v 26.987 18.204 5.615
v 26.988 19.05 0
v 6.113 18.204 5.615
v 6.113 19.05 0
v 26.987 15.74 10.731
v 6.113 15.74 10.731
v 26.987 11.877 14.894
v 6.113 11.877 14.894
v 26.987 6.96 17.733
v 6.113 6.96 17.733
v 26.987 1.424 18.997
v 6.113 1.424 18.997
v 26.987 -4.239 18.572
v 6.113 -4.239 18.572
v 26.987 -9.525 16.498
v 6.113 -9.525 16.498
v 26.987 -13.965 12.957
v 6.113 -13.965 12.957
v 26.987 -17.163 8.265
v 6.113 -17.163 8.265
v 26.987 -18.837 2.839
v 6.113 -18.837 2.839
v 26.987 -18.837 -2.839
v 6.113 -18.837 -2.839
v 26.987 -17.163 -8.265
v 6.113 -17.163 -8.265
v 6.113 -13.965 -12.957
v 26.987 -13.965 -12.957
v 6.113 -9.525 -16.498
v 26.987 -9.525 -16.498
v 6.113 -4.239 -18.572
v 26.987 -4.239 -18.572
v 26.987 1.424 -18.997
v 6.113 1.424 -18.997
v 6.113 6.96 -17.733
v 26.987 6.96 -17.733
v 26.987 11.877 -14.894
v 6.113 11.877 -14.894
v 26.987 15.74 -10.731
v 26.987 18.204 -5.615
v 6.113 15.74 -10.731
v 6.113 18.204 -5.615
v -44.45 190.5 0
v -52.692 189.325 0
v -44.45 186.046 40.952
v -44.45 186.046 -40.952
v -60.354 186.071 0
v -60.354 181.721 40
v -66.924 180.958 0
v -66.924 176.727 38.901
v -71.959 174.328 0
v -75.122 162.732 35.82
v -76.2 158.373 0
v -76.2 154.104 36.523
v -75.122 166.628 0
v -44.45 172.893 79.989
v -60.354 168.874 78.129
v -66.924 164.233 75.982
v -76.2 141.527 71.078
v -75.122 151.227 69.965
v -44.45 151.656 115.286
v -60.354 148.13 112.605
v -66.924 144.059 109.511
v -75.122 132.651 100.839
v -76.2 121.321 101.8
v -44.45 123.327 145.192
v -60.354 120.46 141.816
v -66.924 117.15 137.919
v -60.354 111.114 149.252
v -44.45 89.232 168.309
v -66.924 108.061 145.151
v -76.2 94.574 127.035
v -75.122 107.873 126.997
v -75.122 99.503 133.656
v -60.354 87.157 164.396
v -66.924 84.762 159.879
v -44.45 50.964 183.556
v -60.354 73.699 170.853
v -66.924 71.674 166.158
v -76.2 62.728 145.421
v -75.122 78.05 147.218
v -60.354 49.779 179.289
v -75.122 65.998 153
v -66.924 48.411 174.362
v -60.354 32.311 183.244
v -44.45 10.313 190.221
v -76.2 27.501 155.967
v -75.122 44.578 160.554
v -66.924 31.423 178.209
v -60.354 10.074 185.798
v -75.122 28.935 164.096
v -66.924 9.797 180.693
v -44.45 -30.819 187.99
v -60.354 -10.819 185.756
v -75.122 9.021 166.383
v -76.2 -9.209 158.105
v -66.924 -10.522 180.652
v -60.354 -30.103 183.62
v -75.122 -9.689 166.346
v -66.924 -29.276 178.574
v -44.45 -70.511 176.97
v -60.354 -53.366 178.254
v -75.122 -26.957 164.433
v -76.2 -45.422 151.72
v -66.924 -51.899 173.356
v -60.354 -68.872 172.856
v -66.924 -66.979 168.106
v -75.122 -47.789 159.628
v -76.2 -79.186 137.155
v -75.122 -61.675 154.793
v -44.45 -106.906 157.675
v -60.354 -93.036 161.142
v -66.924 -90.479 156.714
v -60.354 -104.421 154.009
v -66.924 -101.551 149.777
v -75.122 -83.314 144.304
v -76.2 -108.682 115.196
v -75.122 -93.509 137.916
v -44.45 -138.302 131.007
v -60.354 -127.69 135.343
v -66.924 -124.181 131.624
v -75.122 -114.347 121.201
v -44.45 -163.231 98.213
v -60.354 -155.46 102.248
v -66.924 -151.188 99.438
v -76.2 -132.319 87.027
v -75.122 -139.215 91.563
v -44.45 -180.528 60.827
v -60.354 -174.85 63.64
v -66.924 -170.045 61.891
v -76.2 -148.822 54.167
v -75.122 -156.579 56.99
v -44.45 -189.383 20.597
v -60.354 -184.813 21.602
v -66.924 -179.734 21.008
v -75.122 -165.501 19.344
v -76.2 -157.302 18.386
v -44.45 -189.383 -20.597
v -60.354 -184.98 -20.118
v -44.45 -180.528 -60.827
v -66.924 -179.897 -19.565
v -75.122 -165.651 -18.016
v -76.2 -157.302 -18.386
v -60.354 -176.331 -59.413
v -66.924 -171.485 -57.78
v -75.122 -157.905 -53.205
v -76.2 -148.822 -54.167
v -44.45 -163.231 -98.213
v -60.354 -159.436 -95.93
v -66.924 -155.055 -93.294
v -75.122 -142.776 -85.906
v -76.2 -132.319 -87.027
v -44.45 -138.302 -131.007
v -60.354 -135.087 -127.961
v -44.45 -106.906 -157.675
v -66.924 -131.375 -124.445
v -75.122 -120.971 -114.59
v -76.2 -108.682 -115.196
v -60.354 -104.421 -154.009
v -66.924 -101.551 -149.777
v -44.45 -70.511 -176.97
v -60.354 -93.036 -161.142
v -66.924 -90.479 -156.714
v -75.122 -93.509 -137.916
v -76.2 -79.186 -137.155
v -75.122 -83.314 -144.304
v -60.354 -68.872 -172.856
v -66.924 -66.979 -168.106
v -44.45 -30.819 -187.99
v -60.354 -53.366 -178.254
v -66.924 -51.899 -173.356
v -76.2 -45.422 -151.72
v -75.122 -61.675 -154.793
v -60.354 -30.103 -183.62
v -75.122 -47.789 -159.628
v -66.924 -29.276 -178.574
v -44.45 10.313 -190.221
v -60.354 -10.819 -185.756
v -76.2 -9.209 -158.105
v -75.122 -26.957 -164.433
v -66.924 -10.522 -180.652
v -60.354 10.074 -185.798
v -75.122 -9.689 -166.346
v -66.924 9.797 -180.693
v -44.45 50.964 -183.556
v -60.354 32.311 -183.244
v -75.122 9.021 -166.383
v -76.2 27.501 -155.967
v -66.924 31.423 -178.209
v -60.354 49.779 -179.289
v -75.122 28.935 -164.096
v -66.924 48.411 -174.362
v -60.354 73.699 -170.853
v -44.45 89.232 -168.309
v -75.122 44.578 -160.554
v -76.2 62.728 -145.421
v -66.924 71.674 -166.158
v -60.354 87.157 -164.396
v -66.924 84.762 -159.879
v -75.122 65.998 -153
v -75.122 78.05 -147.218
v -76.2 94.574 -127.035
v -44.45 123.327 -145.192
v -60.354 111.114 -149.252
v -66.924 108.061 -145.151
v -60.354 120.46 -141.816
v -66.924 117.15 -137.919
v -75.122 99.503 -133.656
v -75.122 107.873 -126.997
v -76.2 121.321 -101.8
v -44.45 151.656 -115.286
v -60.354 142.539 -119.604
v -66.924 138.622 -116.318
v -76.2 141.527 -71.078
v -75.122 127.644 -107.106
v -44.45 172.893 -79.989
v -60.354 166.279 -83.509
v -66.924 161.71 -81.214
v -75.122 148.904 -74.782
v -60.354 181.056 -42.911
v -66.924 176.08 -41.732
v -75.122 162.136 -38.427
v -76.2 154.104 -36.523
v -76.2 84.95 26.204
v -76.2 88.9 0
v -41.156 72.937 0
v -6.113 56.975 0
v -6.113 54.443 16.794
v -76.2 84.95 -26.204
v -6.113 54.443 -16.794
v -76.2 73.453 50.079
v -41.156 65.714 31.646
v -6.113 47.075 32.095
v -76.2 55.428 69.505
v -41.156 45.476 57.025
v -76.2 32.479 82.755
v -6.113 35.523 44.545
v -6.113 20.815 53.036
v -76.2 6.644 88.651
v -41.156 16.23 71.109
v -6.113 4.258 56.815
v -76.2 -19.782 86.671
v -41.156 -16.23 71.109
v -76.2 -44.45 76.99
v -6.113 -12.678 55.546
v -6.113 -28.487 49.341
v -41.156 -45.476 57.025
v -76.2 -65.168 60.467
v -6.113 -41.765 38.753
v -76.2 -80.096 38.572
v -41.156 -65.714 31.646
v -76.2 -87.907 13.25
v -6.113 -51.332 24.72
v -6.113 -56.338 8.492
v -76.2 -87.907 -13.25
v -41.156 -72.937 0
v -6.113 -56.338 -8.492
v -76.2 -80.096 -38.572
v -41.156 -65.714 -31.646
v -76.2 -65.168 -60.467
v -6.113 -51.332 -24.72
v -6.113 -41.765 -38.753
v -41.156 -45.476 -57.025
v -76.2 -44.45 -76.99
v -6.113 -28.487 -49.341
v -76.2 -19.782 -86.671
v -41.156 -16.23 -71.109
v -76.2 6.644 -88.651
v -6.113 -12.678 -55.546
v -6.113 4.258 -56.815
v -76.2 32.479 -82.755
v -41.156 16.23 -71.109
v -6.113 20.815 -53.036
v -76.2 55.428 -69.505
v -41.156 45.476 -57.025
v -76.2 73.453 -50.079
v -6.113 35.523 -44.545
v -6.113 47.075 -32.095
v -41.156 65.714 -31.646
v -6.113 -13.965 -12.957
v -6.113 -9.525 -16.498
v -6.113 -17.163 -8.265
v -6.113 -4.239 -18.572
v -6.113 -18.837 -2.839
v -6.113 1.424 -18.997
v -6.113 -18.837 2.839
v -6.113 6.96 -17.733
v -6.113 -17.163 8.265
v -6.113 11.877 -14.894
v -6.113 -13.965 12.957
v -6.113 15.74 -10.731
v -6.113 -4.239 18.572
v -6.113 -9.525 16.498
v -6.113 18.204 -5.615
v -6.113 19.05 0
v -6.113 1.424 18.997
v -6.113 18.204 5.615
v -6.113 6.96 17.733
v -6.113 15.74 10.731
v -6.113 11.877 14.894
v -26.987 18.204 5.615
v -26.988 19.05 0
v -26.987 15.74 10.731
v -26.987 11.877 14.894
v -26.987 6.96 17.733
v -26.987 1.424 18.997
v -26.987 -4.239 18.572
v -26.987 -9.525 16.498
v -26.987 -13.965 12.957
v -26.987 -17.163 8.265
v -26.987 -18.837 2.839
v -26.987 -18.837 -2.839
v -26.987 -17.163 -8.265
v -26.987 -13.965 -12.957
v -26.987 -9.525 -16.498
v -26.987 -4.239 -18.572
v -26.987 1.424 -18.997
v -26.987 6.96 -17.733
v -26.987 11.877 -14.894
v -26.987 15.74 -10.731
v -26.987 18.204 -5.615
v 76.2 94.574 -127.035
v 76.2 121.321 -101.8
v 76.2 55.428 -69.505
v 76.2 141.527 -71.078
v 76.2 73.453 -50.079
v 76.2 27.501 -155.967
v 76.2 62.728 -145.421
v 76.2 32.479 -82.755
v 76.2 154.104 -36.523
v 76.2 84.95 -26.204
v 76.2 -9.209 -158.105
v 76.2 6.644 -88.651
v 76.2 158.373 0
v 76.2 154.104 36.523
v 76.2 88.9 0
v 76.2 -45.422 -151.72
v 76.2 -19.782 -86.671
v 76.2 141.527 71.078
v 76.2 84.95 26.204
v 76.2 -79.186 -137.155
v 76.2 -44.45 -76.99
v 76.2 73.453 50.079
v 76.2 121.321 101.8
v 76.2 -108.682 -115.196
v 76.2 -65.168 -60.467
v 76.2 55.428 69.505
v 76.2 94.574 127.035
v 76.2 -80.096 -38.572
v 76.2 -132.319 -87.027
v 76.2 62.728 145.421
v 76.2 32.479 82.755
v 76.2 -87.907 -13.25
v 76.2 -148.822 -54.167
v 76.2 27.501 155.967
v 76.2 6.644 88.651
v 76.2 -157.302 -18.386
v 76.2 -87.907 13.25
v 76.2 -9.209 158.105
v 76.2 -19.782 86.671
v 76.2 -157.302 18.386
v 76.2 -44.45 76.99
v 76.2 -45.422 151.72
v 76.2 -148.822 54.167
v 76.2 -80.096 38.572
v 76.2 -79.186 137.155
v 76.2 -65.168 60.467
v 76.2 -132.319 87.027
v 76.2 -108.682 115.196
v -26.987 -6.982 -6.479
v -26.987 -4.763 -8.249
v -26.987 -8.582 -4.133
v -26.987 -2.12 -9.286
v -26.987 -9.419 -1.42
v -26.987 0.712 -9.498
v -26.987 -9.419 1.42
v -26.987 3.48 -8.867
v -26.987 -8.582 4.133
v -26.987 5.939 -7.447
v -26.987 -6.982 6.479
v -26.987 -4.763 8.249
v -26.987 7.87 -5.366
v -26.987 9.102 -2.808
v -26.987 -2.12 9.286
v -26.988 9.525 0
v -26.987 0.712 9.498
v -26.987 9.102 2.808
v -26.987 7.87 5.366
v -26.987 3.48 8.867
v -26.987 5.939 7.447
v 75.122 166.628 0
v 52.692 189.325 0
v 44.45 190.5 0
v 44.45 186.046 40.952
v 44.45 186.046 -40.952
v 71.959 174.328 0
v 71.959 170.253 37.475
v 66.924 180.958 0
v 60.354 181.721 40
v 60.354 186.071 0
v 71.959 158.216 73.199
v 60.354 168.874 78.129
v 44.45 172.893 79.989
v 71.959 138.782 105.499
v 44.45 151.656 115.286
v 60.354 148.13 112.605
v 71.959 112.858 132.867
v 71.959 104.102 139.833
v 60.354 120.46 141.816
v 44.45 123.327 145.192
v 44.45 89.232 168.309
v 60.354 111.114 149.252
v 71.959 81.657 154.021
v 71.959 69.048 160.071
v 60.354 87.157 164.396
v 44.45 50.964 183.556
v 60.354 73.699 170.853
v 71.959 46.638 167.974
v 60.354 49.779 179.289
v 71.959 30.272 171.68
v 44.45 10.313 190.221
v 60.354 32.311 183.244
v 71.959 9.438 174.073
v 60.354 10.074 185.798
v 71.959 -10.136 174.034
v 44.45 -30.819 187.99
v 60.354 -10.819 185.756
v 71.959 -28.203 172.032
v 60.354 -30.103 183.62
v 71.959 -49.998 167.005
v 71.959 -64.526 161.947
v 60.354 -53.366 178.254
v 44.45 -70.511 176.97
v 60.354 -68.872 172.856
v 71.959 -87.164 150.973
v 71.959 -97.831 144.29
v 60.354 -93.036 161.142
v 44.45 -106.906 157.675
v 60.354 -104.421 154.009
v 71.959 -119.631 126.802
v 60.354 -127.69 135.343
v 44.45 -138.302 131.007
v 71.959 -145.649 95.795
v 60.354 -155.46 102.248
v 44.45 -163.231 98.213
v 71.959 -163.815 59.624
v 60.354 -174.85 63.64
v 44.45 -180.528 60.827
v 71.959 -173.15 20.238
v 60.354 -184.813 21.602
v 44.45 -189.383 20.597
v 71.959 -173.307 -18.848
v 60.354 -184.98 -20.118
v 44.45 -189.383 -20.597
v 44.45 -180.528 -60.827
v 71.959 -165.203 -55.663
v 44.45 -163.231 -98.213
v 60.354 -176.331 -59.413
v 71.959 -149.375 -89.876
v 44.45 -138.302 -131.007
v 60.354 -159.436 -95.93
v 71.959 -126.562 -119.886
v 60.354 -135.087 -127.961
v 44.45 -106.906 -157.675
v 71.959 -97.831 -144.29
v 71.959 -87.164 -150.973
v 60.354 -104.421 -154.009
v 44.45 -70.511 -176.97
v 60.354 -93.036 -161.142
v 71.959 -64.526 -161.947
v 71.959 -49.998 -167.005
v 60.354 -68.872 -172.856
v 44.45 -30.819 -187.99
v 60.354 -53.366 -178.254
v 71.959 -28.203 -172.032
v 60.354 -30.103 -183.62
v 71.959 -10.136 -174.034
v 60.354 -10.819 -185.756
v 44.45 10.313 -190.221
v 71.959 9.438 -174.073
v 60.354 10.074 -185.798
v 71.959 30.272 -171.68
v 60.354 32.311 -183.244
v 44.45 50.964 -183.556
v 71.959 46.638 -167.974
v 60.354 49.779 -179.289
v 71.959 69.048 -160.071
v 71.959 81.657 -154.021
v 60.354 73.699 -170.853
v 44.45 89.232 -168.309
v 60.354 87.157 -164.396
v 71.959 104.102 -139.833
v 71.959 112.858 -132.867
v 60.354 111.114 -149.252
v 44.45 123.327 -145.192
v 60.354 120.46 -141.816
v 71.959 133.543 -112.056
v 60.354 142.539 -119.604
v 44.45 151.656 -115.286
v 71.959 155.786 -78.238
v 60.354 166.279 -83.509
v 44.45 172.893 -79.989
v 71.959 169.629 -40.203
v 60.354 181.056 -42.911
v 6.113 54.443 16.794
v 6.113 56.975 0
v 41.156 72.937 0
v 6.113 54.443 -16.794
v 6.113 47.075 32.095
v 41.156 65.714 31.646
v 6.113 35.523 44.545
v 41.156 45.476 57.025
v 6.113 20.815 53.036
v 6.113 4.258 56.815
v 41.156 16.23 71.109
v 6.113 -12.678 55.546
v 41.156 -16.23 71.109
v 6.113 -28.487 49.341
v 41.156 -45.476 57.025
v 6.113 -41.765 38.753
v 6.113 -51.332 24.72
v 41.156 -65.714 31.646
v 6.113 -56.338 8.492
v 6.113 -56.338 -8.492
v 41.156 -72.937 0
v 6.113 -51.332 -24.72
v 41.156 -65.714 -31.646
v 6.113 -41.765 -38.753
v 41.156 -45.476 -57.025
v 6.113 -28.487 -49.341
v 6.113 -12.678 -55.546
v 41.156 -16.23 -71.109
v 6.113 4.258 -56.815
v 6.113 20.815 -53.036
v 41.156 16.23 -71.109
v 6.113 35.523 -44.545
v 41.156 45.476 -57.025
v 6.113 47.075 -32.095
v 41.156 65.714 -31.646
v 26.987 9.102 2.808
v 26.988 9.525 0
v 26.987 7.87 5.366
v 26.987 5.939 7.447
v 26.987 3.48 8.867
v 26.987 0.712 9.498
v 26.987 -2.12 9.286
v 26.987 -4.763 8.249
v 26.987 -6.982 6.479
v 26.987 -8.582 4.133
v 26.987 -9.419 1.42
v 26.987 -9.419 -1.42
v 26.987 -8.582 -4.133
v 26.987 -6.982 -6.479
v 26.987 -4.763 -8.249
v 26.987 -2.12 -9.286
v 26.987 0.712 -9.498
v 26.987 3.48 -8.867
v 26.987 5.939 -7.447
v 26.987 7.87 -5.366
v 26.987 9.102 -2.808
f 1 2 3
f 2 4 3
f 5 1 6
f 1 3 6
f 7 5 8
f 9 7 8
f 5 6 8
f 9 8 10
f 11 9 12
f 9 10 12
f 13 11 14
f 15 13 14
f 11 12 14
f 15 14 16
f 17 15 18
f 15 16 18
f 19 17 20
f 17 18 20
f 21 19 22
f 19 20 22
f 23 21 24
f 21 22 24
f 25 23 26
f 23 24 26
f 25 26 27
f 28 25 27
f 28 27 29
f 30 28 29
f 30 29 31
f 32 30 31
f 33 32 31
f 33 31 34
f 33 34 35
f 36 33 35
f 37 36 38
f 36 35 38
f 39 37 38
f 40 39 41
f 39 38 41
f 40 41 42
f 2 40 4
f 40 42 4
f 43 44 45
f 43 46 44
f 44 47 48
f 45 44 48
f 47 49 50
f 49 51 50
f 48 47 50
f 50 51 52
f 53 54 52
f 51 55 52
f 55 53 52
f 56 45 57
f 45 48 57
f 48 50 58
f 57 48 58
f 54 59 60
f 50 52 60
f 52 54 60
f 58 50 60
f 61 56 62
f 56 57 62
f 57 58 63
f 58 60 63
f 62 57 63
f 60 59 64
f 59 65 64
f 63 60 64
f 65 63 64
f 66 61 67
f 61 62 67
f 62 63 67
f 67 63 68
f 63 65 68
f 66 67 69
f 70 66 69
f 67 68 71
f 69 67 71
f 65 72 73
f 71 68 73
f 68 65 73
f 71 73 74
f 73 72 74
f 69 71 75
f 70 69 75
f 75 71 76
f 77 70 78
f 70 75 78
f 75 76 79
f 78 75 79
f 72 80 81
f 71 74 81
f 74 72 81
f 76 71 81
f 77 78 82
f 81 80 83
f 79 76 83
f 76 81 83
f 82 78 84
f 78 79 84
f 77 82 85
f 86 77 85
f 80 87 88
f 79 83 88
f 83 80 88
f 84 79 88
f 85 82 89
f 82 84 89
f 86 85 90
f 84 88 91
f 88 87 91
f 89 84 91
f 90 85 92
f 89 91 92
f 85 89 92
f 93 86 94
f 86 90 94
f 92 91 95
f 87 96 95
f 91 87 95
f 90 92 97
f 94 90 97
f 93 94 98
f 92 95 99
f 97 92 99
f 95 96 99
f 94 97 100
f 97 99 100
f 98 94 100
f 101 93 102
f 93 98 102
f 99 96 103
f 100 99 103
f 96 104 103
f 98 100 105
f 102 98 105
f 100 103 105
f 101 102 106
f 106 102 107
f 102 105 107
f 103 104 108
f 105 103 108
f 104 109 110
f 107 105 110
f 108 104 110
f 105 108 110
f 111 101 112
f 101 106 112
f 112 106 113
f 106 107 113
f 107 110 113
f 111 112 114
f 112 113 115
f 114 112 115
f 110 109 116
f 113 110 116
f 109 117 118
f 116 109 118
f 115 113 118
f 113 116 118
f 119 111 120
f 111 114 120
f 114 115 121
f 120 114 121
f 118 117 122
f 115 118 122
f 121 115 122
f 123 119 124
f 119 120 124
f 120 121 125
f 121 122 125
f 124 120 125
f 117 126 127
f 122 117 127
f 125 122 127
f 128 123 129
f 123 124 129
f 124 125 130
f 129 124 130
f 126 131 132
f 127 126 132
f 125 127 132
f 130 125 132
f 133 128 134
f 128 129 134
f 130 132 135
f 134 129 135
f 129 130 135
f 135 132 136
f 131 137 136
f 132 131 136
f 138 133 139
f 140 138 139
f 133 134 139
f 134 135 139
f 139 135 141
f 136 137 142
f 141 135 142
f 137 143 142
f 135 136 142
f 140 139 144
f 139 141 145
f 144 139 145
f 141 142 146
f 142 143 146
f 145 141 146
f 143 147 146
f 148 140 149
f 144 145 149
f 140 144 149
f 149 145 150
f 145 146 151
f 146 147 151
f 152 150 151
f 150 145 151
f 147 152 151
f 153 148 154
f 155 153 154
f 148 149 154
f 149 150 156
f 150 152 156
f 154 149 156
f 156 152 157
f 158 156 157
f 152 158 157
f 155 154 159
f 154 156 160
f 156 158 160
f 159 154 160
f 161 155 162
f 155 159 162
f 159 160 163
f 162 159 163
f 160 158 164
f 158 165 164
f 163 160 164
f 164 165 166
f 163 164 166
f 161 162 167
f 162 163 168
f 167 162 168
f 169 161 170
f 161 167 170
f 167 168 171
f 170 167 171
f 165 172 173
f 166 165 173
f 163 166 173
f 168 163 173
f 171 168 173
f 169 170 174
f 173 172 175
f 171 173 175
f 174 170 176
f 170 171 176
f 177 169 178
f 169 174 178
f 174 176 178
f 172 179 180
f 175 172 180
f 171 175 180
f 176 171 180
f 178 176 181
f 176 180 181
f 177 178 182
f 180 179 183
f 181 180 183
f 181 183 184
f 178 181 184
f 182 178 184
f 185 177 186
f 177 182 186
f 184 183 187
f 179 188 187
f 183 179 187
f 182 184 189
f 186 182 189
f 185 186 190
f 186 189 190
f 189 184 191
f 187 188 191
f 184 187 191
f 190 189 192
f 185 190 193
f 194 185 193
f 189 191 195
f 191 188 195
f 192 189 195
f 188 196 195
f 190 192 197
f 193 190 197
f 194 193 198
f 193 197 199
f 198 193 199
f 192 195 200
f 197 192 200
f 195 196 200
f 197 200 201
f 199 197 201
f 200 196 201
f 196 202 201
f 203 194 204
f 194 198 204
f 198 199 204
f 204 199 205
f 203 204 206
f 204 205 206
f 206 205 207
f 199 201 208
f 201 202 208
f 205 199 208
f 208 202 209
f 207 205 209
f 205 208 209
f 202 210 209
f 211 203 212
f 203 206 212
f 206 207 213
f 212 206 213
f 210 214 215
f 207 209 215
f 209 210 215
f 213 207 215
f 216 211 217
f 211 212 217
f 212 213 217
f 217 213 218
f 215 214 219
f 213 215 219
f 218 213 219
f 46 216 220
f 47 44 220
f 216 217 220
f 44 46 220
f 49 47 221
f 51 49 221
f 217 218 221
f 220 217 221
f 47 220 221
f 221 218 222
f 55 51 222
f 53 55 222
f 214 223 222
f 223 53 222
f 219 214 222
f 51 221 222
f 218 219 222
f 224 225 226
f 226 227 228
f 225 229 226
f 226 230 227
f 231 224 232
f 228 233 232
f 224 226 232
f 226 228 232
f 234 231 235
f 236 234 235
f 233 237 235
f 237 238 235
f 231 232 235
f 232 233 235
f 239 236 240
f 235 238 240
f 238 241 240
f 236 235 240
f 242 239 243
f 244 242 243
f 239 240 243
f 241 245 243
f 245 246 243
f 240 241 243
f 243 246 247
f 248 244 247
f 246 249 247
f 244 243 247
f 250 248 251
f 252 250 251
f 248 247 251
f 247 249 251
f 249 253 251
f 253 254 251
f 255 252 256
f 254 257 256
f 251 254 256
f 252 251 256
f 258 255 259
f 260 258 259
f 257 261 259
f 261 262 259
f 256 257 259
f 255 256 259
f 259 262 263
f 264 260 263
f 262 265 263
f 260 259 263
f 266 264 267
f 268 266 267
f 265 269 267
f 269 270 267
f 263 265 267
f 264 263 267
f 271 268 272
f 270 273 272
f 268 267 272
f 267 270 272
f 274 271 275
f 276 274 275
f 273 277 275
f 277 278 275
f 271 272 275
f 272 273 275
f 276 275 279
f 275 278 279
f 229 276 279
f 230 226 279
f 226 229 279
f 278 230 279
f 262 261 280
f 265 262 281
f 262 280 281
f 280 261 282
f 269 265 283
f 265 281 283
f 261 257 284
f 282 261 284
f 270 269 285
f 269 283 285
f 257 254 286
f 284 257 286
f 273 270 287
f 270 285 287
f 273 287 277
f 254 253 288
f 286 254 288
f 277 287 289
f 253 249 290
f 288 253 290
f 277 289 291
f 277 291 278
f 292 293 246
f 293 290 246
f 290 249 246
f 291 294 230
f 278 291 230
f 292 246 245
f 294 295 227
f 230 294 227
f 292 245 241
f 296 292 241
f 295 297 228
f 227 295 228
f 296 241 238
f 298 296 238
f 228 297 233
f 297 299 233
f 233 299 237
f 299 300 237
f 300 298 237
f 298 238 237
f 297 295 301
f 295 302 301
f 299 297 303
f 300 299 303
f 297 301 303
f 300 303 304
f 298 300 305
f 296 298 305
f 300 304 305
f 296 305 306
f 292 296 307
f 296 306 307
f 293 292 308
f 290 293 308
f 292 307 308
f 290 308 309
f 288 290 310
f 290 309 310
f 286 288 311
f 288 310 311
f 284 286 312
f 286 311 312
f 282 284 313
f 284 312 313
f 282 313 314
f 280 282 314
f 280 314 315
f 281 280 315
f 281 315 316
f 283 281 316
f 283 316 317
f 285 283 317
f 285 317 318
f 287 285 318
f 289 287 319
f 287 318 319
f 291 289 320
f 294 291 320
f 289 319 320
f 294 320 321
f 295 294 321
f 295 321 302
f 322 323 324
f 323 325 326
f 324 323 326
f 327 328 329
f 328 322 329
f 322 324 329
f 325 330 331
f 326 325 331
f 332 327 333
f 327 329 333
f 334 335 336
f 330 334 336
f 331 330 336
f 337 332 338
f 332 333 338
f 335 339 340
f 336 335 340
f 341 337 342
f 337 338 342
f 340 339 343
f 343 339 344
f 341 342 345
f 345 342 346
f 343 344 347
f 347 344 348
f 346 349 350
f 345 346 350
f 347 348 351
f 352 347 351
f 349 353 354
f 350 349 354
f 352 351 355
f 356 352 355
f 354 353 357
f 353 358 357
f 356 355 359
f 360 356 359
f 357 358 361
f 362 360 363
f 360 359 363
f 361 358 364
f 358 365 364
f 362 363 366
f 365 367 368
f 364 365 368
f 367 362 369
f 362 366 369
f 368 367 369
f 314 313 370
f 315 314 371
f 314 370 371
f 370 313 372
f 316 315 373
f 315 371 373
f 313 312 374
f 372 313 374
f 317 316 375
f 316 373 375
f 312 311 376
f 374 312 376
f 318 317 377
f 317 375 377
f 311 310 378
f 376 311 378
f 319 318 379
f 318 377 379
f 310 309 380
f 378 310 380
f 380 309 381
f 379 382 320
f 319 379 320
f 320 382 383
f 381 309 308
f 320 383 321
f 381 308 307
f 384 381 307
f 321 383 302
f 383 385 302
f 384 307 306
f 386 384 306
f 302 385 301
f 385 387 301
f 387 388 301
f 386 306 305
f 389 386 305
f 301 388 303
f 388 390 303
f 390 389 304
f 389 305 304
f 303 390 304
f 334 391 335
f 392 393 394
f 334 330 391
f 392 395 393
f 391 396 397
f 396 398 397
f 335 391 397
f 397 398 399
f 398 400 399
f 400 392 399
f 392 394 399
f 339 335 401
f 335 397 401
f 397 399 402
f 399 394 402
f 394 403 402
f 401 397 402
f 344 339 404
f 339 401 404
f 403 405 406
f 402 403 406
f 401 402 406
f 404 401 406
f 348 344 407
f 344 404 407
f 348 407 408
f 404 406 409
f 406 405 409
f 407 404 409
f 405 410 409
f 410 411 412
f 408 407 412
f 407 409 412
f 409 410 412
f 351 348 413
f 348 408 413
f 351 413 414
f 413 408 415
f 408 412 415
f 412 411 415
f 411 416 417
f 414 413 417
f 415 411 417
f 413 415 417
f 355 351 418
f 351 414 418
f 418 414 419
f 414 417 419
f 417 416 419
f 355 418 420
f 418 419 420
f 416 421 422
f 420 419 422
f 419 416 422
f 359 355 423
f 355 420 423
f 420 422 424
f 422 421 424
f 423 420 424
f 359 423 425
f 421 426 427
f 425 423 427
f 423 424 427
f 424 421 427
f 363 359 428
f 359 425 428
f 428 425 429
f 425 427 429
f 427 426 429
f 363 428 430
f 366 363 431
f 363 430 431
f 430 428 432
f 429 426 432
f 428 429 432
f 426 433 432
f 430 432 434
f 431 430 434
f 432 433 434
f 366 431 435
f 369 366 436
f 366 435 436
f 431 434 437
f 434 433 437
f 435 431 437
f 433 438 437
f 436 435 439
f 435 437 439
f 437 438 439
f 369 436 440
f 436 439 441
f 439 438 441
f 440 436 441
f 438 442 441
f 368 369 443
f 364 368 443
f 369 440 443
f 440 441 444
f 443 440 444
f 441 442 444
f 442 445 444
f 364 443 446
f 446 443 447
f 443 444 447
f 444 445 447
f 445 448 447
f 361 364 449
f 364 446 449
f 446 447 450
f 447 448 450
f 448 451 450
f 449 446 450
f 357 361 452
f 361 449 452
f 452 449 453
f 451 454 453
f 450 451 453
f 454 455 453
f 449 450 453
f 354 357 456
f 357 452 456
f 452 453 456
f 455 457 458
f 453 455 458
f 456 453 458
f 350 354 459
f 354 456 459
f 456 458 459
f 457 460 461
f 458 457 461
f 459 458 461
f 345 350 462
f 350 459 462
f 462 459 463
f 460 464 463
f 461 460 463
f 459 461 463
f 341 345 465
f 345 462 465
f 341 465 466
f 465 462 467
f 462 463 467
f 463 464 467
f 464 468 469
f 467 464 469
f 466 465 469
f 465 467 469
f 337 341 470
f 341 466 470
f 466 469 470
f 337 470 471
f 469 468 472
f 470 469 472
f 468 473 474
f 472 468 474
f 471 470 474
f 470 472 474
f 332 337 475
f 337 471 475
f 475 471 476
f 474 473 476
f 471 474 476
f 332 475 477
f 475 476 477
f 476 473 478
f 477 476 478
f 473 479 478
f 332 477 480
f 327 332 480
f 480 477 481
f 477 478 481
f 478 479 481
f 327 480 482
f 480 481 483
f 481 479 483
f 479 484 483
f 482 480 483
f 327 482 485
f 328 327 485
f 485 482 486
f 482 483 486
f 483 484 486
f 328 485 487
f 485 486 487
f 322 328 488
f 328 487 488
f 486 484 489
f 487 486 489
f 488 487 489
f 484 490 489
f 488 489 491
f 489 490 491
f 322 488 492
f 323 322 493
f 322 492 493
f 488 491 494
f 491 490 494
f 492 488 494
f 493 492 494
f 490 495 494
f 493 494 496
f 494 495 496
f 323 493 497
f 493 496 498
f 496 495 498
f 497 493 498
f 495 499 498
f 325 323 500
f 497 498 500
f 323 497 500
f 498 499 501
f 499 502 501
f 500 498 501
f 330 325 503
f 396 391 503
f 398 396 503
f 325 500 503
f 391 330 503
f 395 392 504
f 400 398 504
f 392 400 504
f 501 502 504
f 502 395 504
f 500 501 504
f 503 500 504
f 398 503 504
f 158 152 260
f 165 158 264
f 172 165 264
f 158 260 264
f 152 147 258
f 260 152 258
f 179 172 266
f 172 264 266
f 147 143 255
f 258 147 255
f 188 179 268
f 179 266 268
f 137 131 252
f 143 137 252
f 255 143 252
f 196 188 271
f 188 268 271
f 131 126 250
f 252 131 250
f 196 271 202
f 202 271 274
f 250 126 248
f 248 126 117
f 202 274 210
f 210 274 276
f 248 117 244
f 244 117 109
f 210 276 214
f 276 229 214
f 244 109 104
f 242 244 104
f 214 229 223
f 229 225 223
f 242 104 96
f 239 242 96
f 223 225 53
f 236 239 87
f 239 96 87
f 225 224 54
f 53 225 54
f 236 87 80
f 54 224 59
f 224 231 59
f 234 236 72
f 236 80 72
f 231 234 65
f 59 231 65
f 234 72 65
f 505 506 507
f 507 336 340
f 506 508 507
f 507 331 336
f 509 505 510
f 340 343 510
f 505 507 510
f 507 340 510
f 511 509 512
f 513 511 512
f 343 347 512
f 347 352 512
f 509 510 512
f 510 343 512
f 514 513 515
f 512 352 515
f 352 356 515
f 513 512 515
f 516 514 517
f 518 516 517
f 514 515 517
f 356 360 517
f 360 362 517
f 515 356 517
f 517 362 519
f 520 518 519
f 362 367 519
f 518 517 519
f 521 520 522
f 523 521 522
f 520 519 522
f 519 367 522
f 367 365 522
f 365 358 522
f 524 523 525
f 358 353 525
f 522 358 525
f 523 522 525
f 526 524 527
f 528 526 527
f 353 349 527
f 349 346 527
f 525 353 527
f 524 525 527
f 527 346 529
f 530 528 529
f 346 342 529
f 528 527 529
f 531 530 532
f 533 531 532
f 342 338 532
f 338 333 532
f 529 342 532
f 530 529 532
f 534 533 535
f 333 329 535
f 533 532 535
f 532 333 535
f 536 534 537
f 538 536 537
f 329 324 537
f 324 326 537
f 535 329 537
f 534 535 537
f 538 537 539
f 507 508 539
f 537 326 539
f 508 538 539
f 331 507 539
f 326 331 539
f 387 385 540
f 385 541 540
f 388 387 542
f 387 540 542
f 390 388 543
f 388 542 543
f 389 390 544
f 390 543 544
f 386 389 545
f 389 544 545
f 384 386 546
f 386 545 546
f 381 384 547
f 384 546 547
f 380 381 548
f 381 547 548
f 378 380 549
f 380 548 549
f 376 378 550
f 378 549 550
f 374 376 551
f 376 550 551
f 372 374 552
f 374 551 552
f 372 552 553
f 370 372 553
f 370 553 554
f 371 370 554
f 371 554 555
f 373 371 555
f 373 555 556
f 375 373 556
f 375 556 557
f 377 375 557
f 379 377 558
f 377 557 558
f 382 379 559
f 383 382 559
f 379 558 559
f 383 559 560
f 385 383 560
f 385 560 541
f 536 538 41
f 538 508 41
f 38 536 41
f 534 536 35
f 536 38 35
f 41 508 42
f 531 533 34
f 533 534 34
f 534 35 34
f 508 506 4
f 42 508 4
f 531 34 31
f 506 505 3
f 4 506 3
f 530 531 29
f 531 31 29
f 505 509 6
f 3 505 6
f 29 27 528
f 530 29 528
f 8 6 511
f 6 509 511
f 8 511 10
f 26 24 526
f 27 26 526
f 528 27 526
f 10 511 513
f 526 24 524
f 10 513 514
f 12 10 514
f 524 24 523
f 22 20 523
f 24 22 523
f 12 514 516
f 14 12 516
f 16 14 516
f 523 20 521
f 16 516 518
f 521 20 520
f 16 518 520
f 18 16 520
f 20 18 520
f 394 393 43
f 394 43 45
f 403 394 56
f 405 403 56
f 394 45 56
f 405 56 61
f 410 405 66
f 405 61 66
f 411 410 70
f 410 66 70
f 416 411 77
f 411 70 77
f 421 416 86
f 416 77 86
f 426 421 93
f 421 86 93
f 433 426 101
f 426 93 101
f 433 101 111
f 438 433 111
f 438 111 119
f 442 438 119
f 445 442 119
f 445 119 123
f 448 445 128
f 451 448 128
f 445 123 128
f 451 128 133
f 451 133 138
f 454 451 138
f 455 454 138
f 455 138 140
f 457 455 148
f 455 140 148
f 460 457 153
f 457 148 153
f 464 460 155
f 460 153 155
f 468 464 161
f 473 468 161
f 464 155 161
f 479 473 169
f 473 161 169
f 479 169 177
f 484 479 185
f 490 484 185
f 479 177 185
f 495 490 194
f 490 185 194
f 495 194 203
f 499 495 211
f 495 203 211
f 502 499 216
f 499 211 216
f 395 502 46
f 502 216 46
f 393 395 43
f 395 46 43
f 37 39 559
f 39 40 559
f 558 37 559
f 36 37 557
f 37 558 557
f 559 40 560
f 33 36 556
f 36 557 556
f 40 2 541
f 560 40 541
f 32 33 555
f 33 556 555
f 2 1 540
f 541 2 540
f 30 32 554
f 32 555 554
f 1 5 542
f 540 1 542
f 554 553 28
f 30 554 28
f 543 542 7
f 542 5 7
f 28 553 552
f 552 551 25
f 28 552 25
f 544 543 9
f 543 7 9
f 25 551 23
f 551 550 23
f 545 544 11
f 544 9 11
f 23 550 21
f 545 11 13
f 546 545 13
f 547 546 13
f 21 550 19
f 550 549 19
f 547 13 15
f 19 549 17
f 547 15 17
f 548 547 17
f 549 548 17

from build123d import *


with BuildPart() as part:
    # Sketch1 → Revolve1 (revolve)
    with BuildSketch(Plane.XY):
        with BuildLine():
            Line((-26.9875, 9.525), (26.9875, 9.525))
            Line((26.9875, 9.525), (26.9875, 19.05))
            Line((26.9875, 19.05), (6.112639692, 19.05))
            Line((6.112639692, 19.05), (6.112639692, 56.974587415))
            Line((6.112639692, 56.974587415), (76.2, 88.9))
            Line((76.2, 88.9), (76.2, 158.372961578))
            ThreePointArc((76.2, 158.372961578), (66.923900362, 180.957937381), (44.45, 190.5))
            Line((44.45, 190.5), (-44.45, 190.5))
            ThreePointArc((-44.45, 190.5), (-66.923900362, 180.957937381), (-76.2, 158.372961578))
            Line((-76.2, 158.372961578), (-76.2, 88.9))
            Line((-76.2, 88.9), (-6.112639692, 56.974587415))
            Line((-6.112639692, 56.974587415), (-6.112639692, 19.05))
            Line((-6.112639692, 19.05), (-26.9875, 19.05))
            Line((-26.9875, 19.05), (-26.9875, 9.525))
        make_face()
    revolve(axis=Axis((-76.2, 0, 0), (1, 0, 0)))


solid = part.part
